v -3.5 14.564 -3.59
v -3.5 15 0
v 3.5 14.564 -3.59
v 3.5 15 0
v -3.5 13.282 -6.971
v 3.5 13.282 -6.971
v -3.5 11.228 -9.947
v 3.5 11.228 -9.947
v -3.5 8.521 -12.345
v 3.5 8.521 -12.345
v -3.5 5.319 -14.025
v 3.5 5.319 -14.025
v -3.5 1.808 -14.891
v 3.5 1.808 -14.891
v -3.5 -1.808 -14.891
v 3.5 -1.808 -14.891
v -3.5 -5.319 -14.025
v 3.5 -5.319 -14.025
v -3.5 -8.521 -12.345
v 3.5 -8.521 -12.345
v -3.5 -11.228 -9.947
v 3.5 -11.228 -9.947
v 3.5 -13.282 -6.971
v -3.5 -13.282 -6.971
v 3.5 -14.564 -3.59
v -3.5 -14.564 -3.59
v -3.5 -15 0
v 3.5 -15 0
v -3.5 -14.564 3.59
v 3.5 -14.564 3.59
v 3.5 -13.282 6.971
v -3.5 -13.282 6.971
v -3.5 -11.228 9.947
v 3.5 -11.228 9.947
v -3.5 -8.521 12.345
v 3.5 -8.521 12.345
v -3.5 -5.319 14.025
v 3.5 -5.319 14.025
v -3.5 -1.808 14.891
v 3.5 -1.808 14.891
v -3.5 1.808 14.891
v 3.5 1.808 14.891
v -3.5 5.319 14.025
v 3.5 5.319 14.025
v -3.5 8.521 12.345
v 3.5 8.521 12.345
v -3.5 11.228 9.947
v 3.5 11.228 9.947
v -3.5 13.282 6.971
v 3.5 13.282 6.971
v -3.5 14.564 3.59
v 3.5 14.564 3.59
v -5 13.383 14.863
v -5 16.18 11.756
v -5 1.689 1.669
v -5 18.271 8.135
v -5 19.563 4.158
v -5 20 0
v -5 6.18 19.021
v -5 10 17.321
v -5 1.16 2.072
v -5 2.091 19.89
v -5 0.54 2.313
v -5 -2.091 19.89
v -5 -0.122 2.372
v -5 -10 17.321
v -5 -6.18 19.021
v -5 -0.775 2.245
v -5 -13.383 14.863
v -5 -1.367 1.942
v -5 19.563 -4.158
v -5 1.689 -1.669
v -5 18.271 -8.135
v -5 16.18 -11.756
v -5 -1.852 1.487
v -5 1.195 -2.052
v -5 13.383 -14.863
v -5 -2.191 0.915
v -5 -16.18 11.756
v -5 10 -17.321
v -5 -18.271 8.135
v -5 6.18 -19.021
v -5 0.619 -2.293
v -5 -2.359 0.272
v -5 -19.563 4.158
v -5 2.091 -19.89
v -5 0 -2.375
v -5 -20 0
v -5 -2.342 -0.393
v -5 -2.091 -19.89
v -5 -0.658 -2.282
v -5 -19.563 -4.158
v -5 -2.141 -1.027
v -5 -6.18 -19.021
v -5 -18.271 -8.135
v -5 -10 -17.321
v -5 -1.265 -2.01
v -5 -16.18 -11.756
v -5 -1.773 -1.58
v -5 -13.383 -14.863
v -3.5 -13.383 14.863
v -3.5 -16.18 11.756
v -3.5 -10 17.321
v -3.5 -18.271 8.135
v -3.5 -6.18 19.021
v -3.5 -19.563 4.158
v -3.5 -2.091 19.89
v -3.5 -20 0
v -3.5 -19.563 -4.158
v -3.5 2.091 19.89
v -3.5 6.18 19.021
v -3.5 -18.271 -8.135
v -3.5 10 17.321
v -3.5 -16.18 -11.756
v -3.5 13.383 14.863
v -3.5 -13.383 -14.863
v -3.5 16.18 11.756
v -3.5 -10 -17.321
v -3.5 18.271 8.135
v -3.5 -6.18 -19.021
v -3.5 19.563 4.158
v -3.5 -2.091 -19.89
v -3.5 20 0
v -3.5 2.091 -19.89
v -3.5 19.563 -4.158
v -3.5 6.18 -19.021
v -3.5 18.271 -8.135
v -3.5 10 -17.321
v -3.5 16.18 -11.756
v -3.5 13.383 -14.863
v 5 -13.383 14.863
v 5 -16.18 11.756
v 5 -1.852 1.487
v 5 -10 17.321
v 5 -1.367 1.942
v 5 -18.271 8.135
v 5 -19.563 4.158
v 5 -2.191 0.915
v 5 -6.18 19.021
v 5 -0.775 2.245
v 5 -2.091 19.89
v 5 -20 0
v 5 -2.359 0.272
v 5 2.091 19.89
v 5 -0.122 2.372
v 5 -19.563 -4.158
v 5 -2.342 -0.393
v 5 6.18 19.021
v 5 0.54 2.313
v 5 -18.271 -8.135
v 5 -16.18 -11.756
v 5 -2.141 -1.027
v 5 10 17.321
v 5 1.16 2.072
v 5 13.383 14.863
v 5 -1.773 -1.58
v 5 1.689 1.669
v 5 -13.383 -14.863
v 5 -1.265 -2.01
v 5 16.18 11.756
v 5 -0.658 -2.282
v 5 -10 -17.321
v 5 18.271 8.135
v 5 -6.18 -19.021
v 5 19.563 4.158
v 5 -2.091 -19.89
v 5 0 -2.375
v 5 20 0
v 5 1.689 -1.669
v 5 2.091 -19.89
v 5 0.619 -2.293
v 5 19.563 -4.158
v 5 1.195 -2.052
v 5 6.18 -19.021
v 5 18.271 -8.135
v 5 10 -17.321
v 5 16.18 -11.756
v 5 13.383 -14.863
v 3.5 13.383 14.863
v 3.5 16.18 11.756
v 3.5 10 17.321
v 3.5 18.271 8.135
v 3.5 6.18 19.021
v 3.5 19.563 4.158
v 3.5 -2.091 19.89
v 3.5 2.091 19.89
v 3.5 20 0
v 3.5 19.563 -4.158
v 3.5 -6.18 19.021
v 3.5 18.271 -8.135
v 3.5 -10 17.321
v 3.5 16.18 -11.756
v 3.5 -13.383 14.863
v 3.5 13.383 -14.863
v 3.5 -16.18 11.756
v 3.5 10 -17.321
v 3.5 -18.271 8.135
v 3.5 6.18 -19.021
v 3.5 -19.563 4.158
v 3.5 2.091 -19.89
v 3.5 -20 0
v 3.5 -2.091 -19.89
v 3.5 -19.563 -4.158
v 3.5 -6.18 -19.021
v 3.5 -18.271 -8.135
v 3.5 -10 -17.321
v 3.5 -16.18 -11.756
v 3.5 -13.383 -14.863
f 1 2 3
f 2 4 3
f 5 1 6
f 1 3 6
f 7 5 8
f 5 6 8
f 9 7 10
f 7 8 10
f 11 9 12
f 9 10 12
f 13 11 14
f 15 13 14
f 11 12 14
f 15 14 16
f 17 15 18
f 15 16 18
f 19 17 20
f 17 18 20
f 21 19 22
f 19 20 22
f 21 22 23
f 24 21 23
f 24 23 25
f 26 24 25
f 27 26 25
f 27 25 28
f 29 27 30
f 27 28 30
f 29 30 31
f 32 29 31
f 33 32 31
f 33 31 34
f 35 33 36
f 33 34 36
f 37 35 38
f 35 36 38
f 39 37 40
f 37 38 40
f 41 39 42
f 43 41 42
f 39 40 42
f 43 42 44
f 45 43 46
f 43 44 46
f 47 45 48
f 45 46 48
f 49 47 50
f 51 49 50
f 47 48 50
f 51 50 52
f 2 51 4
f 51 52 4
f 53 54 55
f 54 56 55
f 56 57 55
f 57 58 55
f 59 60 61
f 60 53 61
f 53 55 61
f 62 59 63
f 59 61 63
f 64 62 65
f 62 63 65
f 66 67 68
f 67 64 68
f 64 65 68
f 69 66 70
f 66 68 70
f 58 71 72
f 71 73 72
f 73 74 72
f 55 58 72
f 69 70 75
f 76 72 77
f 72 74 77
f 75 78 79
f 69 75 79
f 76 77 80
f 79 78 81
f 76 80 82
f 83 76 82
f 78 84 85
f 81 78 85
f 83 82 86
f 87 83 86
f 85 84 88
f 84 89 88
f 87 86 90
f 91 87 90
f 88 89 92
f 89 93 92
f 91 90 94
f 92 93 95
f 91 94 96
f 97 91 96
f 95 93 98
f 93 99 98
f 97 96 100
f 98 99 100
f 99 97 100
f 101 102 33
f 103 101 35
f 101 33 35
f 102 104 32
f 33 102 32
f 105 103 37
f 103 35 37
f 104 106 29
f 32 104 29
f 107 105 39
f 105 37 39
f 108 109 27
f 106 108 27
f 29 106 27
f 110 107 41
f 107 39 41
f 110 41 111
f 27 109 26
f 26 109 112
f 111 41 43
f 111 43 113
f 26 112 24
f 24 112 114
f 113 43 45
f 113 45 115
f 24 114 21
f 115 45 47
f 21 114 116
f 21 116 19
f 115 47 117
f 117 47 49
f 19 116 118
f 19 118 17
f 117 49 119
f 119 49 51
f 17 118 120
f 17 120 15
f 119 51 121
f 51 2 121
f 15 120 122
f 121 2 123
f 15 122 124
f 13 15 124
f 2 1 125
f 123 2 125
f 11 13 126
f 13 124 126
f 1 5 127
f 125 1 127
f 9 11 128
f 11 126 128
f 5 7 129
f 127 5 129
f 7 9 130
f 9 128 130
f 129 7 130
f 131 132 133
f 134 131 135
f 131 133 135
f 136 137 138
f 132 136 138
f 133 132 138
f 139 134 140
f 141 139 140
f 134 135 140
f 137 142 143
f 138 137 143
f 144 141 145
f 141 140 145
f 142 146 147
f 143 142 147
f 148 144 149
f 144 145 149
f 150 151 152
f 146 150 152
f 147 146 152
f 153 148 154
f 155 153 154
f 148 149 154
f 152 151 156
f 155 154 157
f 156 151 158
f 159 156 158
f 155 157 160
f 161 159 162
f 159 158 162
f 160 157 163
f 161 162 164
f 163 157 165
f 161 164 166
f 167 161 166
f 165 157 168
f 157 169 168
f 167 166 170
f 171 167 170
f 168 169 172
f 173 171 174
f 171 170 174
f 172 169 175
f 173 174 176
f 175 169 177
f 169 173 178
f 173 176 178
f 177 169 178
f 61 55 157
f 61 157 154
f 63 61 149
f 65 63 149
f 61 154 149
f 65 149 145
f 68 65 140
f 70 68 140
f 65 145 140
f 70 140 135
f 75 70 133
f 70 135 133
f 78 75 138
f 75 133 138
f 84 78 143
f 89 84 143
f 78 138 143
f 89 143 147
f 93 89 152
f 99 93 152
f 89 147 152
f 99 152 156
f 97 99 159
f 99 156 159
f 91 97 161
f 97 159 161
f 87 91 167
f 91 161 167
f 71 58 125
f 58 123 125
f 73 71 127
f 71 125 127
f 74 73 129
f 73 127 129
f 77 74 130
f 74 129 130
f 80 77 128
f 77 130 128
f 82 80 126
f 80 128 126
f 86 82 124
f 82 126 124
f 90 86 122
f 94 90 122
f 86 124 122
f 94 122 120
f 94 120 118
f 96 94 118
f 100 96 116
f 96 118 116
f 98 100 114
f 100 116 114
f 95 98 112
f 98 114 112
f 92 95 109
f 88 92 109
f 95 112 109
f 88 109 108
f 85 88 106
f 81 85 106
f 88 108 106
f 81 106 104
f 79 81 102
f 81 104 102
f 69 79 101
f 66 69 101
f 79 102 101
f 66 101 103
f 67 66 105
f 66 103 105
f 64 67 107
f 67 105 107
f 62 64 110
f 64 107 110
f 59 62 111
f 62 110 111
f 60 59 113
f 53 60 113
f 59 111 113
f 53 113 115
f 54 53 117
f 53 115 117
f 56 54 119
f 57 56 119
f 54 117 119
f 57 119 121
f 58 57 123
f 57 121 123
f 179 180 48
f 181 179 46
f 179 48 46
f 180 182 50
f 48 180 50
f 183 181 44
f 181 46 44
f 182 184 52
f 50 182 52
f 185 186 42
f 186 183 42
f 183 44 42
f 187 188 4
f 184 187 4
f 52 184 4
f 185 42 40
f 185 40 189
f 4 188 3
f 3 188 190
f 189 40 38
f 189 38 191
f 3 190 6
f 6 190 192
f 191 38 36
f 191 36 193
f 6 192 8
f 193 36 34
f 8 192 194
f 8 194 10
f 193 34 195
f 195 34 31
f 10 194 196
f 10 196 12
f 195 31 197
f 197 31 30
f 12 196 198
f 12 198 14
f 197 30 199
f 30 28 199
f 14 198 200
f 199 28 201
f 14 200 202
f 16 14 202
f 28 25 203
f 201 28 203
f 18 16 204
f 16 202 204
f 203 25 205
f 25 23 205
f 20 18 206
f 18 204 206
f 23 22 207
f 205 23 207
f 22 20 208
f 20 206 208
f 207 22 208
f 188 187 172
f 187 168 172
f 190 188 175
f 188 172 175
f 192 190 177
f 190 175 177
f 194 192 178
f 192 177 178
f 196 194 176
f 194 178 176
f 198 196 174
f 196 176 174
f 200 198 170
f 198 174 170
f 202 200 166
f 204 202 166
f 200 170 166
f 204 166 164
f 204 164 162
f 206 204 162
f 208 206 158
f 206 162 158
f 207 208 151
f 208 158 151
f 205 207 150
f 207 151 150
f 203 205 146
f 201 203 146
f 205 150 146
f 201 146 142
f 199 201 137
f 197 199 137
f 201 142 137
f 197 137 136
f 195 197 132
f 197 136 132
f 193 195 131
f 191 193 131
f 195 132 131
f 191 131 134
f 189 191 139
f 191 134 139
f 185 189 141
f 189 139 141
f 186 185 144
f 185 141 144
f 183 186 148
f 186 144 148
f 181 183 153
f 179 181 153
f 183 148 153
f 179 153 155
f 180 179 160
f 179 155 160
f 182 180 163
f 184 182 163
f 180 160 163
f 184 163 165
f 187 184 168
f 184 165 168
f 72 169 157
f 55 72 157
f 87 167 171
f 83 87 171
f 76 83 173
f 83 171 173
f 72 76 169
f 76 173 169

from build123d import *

# Parameters (mm, degrees)
CUT_EXTRUDE1_DEPTH = 11


with BuildPart() as part:
    # Sketch1 → Revolve1 (revolve)
    with BuildSketch(Plane.XY):
        Polygon((-5, 0), (-5, 20), (-3.5, 20), (-3.5, 15), (3.5, 15), (3.5, 20), (5, 20), (5, 0), align=None)
    revolve(axis=Axis((5, 0, 0), (-1, 0, 0)))

    # Sketch2 → Cut-Extrude1 (cut, through all)
    with BuildSketch(Plane(origin=(5, 0, 0), x_dir=(0, 0, -1), z_dir=(1, 0, 0))):
        with BuildLine():
            Line((1.66945, 1.689108258), (-1.66945, 1.689108258))
            ThreePointArc((-1.66945, 1.689108258), (-0.915252207, -2.191452351), (2.3749, 0))
            ThreePointArc((2.3749, 0), (2.191452351, 0.915252207), (1.66945, 1.689108258))
        make_face()
    extrude(amount=-CUT_EXTRUDE1_DEPTH, mode=Mode.SUBTRACT)


solid = part.part
